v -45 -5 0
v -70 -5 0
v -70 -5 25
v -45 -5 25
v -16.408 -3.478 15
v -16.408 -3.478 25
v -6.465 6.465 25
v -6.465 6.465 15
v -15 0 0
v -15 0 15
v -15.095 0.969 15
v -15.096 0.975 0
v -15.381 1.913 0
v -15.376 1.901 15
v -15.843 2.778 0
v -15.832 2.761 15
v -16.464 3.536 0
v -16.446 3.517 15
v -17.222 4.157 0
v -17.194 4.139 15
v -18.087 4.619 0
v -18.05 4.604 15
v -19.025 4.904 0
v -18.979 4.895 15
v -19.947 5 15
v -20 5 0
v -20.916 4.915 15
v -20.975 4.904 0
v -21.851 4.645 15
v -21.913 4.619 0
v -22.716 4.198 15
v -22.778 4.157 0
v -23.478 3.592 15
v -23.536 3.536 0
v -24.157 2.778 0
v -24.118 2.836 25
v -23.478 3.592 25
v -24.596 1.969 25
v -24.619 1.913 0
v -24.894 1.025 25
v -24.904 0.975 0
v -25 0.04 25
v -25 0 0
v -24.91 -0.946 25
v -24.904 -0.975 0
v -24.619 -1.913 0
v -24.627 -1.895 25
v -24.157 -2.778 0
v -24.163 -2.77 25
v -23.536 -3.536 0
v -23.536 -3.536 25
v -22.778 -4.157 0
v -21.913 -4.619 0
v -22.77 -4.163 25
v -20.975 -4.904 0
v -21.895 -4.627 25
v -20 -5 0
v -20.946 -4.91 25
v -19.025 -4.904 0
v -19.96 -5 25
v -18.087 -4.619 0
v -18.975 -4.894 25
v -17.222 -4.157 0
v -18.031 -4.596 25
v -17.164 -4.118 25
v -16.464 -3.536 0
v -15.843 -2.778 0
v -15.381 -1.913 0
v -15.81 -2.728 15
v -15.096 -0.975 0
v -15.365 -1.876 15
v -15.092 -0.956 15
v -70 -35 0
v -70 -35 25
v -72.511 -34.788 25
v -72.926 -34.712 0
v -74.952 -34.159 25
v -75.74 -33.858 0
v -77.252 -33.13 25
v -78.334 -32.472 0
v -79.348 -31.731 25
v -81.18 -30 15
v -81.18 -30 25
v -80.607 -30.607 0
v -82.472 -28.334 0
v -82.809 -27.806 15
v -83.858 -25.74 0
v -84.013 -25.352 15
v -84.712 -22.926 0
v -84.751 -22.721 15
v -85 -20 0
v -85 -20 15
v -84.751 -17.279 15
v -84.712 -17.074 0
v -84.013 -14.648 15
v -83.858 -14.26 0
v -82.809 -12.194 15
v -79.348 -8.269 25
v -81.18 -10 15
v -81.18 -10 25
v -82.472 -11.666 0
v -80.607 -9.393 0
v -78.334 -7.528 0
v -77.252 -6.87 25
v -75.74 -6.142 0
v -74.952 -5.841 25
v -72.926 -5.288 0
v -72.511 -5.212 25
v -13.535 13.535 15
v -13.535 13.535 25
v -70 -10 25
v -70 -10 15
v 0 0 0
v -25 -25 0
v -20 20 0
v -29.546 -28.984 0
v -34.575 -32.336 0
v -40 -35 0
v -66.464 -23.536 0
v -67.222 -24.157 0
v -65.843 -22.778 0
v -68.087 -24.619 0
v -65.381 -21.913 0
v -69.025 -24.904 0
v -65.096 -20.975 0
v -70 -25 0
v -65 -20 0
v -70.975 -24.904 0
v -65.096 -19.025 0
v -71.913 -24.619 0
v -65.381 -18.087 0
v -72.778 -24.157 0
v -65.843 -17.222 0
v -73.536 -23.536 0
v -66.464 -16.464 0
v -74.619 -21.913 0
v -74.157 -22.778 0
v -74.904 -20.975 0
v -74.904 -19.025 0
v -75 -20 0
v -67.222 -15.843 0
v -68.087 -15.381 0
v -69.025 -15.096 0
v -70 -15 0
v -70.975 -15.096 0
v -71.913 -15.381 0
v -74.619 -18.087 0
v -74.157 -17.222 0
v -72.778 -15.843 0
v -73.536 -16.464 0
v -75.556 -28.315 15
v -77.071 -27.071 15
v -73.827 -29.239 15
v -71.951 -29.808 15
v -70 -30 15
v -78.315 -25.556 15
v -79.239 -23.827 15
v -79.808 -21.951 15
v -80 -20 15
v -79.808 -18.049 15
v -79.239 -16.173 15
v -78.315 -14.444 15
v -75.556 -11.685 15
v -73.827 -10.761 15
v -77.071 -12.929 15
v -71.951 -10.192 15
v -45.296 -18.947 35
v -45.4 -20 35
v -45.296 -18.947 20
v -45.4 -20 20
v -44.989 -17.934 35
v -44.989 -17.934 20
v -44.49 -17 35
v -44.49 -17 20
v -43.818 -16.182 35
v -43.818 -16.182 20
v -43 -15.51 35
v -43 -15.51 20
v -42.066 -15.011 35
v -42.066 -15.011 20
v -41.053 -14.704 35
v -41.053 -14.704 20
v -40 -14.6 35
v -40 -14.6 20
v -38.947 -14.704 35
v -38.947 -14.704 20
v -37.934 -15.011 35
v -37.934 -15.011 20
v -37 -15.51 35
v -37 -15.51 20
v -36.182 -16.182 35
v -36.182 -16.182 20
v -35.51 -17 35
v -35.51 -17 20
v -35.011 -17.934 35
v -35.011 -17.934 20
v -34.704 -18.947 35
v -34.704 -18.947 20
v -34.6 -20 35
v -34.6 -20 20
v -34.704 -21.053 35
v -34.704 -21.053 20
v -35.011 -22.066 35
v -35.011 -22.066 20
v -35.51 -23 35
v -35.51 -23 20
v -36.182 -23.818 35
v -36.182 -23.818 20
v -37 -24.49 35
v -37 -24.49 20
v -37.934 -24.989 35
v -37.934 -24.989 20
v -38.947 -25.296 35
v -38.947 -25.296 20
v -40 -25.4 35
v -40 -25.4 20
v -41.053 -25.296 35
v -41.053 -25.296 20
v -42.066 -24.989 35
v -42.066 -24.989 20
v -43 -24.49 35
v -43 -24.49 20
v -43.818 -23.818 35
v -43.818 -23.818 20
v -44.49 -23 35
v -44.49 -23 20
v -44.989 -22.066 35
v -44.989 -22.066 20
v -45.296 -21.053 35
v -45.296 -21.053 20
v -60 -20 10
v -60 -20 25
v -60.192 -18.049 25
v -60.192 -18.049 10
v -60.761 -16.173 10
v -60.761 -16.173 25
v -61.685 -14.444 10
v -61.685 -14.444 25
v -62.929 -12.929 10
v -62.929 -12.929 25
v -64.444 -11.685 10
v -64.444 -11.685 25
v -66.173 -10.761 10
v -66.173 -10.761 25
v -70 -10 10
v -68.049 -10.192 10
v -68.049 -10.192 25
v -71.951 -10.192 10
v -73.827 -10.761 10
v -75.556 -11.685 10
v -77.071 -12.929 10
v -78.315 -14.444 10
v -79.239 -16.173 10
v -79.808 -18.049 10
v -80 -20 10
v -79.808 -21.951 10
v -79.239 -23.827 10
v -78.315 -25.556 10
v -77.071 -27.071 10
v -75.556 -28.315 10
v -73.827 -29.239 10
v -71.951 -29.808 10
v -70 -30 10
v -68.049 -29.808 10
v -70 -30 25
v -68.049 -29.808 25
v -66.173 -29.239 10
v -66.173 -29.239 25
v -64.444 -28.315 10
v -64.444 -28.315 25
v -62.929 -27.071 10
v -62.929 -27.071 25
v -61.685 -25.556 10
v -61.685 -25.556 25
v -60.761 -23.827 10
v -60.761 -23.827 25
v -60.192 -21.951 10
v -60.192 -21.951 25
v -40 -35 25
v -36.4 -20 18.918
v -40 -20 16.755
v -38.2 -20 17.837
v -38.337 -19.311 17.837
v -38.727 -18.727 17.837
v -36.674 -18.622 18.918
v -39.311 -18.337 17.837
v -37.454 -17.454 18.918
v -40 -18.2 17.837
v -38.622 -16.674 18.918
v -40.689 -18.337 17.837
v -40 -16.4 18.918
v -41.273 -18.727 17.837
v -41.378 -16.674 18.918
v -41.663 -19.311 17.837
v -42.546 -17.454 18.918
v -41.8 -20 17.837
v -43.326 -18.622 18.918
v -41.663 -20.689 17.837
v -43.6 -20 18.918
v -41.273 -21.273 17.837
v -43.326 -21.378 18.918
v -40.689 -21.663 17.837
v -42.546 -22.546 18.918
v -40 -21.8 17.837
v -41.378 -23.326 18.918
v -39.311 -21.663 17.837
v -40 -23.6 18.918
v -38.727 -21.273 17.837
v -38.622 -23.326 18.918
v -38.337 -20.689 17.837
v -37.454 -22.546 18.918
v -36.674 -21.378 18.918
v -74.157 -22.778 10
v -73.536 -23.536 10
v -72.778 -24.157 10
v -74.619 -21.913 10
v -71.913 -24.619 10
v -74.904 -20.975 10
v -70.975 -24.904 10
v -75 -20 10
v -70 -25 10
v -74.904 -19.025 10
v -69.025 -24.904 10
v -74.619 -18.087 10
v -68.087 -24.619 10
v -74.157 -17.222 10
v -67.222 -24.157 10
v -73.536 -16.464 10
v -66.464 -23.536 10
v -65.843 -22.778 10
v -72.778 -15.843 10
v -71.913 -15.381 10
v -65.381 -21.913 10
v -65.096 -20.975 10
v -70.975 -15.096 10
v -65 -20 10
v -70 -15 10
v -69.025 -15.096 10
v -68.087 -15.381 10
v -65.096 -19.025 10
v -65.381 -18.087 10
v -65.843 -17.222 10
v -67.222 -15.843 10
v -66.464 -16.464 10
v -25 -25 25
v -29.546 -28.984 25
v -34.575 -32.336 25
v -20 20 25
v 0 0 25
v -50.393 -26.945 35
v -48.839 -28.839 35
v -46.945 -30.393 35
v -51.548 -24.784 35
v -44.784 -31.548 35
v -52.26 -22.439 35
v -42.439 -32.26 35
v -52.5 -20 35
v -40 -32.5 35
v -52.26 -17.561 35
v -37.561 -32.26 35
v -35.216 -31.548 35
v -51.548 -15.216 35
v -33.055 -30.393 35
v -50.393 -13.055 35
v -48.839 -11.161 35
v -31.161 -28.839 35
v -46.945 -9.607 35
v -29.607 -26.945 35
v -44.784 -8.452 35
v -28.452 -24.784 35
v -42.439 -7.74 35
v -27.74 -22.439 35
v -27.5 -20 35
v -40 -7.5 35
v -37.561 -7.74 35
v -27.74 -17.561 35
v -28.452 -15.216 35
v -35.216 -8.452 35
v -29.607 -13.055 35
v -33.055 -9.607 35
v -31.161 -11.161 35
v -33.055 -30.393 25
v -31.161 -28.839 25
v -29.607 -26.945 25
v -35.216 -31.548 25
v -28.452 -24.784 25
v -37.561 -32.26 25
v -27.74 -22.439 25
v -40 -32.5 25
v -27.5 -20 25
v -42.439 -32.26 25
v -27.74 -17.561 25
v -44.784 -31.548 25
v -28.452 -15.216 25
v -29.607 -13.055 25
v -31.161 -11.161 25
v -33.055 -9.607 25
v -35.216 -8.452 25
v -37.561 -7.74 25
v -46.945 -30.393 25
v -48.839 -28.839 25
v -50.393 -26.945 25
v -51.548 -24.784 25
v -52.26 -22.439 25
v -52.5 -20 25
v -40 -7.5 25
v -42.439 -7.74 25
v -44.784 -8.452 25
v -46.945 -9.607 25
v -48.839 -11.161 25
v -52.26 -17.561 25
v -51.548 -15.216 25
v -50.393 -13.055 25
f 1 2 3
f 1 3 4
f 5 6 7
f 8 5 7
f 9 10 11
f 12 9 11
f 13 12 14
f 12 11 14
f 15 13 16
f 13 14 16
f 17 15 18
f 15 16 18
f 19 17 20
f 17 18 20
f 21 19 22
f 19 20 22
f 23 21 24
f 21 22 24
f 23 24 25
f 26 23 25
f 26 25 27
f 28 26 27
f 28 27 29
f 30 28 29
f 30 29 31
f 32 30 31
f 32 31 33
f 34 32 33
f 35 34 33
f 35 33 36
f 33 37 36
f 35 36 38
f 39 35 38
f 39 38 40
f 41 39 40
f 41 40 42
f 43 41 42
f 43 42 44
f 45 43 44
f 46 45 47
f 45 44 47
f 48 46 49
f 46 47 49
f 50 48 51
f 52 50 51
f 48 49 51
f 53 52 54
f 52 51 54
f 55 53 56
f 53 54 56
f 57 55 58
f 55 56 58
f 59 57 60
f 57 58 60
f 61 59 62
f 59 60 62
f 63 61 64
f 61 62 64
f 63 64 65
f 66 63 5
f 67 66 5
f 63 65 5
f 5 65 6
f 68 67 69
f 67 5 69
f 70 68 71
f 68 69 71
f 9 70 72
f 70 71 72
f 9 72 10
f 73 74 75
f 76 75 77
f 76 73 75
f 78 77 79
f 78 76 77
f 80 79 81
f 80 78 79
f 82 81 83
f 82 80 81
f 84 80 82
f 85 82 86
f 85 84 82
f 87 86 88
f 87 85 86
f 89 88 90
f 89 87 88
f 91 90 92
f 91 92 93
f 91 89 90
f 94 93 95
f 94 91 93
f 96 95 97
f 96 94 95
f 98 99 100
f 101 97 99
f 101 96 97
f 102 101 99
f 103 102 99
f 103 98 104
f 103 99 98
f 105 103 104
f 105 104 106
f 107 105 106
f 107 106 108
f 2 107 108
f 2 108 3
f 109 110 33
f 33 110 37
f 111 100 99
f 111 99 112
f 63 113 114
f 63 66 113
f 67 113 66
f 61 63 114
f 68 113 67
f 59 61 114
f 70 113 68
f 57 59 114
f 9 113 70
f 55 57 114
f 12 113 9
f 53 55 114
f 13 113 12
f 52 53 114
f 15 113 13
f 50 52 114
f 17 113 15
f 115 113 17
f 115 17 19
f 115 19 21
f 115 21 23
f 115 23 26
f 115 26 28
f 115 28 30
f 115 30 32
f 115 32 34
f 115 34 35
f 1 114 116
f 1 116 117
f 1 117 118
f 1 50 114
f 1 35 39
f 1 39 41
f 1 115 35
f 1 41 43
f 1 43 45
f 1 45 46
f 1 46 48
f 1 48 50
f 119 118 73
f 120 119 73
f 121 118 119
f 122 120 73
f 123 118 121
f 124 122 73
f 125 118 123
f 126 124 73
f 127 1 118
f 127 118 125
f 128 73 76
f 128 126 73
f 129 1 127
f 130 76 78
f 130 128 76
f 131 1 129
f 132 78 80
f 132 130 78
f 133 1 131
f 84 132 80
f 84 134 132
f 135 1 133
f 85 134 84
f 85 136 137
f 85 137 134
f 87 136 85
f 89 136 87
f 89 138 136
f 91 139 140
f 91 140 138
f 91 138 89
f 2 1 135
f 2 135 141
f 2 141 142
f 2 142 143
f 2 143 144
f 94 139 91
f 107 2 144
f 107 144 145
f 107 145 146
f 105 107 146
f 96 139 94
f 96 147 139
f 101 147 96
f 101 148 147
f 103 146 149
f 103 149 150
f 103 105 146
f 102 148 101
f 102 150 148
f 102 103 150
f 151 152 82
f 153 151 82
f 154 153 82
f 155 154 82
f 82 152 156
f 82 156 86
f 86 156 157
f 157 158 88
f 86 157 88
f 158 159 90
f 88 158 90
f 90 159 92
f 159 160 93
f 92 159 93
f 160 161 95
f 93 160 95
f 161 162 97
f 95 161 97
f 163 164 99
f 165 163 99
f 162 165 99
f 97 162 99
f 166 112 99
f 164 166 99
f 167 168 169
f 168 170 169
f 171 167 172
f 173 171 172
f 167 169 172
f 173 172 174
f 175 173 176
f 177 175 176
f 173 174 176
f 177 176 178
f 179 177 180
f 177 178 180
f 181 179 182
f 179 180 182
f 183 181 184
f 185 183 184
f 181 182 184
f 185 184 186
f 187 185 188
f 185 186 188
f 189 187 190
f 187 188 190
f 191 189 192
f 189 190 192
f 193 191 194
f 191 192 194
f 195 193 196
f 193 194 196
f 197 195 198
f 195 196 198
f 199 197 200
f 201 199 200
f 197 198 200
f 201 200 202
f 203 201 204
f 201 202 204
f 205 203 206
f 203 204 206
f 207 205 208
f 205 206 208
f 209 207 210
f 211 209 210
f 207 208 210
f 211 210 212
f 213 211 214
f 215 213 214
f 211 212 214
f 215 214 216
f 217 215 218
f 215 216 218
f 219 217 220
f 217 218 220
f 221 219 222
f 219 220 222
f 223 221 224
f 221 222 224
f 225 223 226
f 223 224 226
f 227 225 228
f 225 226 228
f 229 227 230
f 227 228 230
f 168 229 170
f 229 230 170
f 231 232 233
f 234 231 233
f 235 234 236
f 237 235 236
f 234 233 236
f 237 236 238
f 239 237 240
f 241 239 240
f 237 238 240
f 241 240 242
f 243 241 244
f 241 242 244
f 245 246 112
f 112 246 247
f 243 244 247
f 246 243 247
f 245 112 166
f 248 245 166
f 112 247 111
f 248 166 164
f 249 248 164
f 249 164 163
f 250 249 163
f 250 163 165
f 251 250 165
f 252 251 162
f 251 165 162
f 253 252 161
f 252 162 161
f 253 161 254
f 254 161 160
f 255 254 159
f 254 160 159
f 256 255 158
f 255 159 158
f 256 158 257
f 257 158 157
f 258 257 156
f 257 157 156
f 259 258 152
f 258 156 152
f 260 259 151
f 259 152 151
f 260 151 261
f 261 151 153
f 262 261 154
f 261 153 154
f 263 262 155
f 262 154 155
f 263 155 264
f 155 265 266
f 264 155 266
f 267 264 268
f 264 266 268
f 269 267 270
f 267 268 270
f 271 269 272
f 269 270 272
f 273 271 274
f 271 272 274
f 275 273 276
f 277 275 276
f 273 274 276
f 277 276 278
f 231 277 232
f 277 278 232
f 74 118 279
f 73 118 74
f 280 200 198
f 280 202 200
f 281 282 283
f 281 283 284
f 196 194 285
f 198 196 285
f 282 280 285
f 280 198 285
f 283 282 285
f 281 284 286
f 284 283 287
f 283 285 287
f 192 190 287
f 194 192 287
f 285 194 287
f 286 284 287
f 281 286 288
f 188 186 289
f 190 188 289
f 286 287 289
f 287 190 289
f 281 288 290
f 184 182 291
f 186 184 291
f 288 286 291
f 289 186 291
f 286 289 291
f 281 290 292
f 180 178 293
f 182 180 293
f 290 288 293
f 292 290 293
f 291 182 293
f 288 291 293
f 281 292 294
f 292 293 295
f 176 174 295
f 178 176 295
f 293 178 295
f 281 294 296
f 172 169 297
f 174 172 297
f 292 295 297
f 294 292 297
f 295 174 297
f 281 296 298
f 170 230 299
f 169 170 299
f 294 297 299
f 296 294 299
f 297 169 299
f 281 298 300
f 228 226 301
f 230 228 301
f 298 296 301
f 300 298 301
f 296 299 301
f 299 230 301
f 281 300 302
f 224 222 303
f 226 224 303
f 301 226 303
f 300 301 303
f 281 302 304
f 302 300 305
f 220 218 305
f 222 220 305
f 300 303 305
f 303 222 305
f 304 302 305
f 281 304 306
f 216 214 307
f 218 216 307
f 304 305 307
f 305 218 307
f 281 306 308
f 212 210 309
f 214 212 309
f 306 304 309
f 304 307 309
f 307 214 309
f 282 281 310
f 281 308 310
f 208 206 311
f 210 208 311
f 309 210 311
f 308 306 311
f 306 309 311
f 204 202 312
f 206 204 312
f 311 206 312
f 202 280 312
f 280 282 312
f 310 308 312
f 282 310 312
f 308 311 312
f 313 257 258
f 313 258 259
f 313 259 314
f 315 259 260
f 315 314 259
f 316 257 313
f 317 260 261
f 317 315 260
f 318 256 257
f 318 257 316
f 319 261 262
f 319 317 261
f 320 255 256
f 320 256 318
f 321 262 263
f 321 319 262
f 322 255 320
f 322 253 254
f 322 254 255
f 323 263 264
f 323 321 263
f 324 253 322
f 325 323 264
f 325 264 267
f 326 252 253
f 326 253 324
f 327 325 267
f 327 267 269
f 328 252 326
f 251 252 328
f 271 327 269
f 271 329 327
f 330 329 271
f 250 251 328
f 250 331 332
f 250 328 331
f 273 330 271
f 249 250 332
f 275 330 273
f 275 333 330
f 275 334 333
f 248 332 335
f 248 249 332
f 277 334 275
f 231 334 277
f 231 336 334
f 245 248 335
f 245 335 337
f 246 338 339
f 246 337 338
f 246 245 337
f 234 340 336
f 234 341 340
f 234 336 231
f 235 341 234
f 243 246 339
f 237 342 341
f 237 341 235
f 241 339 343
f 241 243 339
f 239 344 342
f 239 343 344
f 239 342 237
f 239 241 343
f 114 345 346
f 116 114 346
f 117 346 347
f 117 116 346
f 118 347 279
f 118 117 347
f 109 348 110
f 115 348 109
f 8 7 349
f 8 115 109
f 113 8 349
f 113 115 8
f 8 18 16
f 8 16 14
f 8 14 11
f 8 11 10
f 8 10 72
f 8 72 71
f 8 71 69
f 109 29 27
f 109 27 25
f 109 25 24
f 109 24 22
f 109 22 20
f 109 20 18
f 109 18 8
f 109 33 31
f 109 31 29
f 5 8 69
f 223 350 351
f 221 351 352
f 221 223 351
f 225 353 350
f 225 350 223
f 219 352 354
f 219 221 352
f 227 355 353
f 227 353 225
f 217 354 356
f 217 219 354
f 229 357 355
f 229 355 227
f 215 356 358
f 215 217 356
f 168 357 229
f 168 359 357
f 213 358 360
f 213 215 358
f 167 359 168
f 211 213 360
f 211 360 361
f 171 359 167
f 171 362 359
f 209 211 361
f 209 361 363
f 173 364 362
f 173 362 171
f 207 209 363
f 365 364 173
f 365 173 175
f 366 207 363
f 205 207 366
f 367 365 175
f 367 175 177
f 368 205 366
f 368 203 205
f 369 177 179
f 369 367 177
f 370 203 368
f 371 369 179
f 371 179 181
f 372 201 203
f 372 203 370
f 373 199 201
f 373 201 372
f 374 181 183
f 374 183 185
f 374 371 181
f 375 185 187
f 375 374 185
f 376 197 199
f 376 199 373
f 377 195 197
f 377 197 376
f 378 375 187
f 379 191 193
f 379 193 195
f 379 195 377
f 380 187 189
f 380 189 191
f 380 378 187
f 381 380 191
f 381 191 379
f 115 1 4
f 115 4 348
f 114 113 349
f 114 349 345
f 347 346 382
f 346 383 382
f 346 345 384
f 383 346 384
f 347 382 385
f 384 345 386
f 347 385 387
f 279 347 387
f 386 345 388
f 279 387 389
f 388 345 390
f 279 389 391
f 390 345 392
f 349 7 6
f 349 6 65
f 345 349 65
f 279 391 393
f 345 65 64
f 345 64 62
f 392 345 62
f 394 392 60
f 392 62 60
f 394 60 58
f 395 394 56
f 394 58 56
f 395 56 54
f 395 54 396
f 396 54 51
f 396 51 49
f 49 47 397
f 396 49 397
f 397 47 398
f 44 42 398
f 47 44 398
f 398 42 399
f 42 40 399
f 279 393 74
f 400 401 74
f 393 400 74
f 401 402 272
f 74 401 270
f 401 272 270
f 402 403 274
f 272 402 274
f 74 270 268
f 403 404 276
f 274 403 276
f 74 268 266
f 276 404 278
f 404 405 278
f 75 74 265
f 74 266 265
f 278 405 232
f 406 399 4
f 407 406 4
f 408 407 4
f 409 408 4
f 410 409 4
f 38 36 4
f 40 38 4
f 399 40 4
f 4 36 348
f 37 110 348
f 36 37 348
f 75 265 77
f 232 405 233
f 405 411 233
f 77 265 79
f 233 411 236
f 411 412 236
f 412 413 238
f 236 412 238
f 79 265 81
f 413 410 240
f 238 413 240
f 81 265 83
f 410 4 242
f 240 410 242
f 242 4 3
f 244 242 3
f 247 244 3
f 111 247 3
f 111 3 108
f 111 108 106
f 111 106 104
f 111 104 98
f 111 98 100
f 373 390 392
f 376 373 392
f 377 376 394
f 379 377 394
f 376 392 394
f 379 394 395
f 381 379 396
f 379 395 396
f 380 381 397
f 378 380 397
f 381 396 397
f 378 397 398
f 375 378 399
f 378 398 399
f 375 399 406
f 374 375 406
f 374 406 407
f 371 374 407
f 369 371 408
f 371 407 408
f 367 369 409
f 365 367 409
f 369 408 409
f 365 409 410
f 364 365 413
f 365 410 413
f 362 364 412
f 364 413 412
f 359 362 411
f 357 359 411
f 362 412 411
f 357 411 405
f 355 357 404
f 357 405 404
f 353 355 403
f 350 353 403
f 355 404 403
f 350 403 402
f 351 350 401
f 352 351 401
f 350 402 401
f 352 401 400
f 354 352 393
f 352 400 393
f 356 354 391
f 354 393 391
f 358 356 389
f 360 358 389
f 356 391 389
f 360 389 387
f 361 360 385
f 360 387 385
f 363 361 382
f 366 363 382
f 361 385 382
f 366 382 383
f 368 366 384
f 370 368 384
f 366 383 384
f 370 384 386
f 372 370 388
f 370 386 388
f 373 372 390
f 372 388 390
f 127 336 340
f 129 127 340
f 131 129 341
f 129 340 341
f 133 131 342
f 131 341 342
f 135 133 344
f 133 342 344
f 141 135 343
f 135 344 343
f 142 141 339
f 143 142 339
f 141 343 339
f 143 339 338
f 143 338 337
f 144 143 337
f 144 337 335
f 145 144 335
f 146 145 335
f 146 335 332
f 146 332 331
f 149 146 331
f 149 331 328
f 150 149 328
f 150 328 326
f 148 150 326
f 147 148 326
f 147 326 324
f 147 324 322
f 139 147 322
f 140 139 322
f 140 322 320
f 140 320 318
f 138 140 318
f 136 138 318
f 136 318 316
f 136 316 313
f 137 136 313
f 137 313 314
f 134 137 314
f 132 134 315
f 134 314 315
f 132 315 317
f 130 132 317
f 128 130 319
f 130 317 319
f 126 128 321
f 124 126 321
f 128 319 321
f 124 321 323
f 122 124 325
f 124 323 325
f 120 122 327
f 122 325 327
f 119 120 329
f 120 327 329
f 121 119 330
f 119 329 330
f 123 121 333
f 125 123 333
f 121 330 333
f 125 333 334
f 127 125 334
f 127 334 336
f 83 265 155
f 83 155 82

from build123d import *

# Parameters (mm, degrees)
BOSS_EXTRUDE2_DEPTH         = 25
SKETCH2_R                   = 5
CUT_EXTRUDE1_DEPTH          = 63
CUT_EXTRUDE2_DEPTH          = 10
SKETCH4_R                   = 12.5
BOSS_EXTRUDE4_DEPTH         = 10
SKETCH10_R                  = 10
CUT_EXTRUDE3_DEPTH          = 15
SKETCH11_R                  = 5
CUT_EXTRUDE4_DEPTH          = 872
CUT_EXTRUDE6_DEPTH          = 10
M12X1_25_TAPPED_HOLE1_D     = 10.8
M12X1_25_TAPPED_HOLE1_DEPTH = 15
M12X1_25_TAPPED_HOLE1_TIP   = 3.244647343


with BuildPart() as part:
    # Sketch1 → Boss-Extrude2 (new body)
    with BuildSketch(Plane.XY):
        with BuildLine():
            Line((-45, -5), (-20, 20))
            Line((-20, 20), (0, 0))
            Line((0, 0), (-25, -25))
            ThreePointArc((-25, -25), (-32.004902432, -30.742646352), (-40, -35))
            Line((-40, -35), (-70, -35))
            ThreePointArc((-70, -35), (-85, -20), (-70, -5))
            Line((-70, -5), (-45, -5))
        make_face()
    extrude(amount=BOSS_EXTRUDE2_DEPTH)

    # Sketch2 → Cut-Extrude1 (cut)
    with BuildSketch(Plane.XY.offset(25)):
        with Locations((-20, 0)):
            Circle(SKETCH2_R)
    extrude(amount=-CUT_EXTRUDE1_DEPTH, mode=Mode.SUBTRACT)

    # Sketch3 → Cut-Extrude2 (cut)
    with BuildSketch(Plane.XY.offset(25)):
        with BuildLine():
            Line((-6.464921114, 6.464921114), (-13.535078886, 13.535078886))
            Line((-13.535078886, 13.535078886), (-23.478357909, 3.591799863))
            ThreePointArc((-23.478357909, 3.591799863), (-18.049588447, 4.603899953), (-15, 0))
            ThreePointArc((-15, 0), (-15.365401888, -1.876299641), (-16.408200137, -3.478357909))
            Line((-16.408200137, -3.478357909), (-6.464921114, 6.464921114))
        make_face()
    extrude(amount=-CUT_EXTRUDE2_DEPTH, mode=Mode.SUBTRACT)

    # Sketch4 → Boss-Extrude4 (add)
    with BuildSketch(Plane.XY.offset(25)):
        with Locations((-40, -20)):
            Circle(SKETCH4_R)
    extrude(amount=BOSS_EXTRUDE4_DEPTH)

    # Sketch10 → Cut-Extrude3 (cut)
    with BuildSketch(Plane.XY.offset(25)):
        with Locations((-70, -20)):
            Circle(SKETCH10_R)
    extrude(amount=-CUT_EXTRUDE3_DEPTH, mode=Mode.SUBTRACT)

    # Sketch11 → Cut-Extrude4 (cut)
    with BuildSketch(Plane.XY.offset(10)):
        with Locations((-70, -20)):
            Circle(SKETCH11_R)
    extrude(amount=-CUT_EXTRUDE4_DEPTH, mode=Mode.SUBTRACT)

    # Sketch12 → Cut-Extrude6 (cut)
    with BuildSketch(Plane.XY.offset(25)):
        with BuildLine():
            Line((-70, -30), (-81.180339887, -30))
            ThreePointArc((-81.180339887, -30), (-85, -20), (-81.180339887, -10))
            Line((-81.180339887, -10), (-70, -10))
            ThreePointArc((-70, -10), (-80, -20), (-70, -30))
        make_face()
    extrude(amount=-CUT_EXTRUDE6_DEPTH, mode=Mode.SUBTRACT)

    # M12x1.25 Tapped Hole1
    with Locations(Plane.XY.offset(35)):
        with Locations((-40, -20)):
            Hole(M12X1_25_TAPPED_HOLE1_D / 2, depth=M12X1_25_TAPPED_HOLE1_DEPTH)
            with Locations((0, 0, -(M12X1_25_TAPPED_HOLE1_DEPTH + M12X1_25_TAPPED_HOLE1_TIP / 2))):  # 118° drill point
                Cone(0, M12X1_25_TAPPED_HOLE1_D / 2, M12X1_25_TAPPED_HOLE1_TIP, mode=Mode.SUBTRACT)


solid = part.part
